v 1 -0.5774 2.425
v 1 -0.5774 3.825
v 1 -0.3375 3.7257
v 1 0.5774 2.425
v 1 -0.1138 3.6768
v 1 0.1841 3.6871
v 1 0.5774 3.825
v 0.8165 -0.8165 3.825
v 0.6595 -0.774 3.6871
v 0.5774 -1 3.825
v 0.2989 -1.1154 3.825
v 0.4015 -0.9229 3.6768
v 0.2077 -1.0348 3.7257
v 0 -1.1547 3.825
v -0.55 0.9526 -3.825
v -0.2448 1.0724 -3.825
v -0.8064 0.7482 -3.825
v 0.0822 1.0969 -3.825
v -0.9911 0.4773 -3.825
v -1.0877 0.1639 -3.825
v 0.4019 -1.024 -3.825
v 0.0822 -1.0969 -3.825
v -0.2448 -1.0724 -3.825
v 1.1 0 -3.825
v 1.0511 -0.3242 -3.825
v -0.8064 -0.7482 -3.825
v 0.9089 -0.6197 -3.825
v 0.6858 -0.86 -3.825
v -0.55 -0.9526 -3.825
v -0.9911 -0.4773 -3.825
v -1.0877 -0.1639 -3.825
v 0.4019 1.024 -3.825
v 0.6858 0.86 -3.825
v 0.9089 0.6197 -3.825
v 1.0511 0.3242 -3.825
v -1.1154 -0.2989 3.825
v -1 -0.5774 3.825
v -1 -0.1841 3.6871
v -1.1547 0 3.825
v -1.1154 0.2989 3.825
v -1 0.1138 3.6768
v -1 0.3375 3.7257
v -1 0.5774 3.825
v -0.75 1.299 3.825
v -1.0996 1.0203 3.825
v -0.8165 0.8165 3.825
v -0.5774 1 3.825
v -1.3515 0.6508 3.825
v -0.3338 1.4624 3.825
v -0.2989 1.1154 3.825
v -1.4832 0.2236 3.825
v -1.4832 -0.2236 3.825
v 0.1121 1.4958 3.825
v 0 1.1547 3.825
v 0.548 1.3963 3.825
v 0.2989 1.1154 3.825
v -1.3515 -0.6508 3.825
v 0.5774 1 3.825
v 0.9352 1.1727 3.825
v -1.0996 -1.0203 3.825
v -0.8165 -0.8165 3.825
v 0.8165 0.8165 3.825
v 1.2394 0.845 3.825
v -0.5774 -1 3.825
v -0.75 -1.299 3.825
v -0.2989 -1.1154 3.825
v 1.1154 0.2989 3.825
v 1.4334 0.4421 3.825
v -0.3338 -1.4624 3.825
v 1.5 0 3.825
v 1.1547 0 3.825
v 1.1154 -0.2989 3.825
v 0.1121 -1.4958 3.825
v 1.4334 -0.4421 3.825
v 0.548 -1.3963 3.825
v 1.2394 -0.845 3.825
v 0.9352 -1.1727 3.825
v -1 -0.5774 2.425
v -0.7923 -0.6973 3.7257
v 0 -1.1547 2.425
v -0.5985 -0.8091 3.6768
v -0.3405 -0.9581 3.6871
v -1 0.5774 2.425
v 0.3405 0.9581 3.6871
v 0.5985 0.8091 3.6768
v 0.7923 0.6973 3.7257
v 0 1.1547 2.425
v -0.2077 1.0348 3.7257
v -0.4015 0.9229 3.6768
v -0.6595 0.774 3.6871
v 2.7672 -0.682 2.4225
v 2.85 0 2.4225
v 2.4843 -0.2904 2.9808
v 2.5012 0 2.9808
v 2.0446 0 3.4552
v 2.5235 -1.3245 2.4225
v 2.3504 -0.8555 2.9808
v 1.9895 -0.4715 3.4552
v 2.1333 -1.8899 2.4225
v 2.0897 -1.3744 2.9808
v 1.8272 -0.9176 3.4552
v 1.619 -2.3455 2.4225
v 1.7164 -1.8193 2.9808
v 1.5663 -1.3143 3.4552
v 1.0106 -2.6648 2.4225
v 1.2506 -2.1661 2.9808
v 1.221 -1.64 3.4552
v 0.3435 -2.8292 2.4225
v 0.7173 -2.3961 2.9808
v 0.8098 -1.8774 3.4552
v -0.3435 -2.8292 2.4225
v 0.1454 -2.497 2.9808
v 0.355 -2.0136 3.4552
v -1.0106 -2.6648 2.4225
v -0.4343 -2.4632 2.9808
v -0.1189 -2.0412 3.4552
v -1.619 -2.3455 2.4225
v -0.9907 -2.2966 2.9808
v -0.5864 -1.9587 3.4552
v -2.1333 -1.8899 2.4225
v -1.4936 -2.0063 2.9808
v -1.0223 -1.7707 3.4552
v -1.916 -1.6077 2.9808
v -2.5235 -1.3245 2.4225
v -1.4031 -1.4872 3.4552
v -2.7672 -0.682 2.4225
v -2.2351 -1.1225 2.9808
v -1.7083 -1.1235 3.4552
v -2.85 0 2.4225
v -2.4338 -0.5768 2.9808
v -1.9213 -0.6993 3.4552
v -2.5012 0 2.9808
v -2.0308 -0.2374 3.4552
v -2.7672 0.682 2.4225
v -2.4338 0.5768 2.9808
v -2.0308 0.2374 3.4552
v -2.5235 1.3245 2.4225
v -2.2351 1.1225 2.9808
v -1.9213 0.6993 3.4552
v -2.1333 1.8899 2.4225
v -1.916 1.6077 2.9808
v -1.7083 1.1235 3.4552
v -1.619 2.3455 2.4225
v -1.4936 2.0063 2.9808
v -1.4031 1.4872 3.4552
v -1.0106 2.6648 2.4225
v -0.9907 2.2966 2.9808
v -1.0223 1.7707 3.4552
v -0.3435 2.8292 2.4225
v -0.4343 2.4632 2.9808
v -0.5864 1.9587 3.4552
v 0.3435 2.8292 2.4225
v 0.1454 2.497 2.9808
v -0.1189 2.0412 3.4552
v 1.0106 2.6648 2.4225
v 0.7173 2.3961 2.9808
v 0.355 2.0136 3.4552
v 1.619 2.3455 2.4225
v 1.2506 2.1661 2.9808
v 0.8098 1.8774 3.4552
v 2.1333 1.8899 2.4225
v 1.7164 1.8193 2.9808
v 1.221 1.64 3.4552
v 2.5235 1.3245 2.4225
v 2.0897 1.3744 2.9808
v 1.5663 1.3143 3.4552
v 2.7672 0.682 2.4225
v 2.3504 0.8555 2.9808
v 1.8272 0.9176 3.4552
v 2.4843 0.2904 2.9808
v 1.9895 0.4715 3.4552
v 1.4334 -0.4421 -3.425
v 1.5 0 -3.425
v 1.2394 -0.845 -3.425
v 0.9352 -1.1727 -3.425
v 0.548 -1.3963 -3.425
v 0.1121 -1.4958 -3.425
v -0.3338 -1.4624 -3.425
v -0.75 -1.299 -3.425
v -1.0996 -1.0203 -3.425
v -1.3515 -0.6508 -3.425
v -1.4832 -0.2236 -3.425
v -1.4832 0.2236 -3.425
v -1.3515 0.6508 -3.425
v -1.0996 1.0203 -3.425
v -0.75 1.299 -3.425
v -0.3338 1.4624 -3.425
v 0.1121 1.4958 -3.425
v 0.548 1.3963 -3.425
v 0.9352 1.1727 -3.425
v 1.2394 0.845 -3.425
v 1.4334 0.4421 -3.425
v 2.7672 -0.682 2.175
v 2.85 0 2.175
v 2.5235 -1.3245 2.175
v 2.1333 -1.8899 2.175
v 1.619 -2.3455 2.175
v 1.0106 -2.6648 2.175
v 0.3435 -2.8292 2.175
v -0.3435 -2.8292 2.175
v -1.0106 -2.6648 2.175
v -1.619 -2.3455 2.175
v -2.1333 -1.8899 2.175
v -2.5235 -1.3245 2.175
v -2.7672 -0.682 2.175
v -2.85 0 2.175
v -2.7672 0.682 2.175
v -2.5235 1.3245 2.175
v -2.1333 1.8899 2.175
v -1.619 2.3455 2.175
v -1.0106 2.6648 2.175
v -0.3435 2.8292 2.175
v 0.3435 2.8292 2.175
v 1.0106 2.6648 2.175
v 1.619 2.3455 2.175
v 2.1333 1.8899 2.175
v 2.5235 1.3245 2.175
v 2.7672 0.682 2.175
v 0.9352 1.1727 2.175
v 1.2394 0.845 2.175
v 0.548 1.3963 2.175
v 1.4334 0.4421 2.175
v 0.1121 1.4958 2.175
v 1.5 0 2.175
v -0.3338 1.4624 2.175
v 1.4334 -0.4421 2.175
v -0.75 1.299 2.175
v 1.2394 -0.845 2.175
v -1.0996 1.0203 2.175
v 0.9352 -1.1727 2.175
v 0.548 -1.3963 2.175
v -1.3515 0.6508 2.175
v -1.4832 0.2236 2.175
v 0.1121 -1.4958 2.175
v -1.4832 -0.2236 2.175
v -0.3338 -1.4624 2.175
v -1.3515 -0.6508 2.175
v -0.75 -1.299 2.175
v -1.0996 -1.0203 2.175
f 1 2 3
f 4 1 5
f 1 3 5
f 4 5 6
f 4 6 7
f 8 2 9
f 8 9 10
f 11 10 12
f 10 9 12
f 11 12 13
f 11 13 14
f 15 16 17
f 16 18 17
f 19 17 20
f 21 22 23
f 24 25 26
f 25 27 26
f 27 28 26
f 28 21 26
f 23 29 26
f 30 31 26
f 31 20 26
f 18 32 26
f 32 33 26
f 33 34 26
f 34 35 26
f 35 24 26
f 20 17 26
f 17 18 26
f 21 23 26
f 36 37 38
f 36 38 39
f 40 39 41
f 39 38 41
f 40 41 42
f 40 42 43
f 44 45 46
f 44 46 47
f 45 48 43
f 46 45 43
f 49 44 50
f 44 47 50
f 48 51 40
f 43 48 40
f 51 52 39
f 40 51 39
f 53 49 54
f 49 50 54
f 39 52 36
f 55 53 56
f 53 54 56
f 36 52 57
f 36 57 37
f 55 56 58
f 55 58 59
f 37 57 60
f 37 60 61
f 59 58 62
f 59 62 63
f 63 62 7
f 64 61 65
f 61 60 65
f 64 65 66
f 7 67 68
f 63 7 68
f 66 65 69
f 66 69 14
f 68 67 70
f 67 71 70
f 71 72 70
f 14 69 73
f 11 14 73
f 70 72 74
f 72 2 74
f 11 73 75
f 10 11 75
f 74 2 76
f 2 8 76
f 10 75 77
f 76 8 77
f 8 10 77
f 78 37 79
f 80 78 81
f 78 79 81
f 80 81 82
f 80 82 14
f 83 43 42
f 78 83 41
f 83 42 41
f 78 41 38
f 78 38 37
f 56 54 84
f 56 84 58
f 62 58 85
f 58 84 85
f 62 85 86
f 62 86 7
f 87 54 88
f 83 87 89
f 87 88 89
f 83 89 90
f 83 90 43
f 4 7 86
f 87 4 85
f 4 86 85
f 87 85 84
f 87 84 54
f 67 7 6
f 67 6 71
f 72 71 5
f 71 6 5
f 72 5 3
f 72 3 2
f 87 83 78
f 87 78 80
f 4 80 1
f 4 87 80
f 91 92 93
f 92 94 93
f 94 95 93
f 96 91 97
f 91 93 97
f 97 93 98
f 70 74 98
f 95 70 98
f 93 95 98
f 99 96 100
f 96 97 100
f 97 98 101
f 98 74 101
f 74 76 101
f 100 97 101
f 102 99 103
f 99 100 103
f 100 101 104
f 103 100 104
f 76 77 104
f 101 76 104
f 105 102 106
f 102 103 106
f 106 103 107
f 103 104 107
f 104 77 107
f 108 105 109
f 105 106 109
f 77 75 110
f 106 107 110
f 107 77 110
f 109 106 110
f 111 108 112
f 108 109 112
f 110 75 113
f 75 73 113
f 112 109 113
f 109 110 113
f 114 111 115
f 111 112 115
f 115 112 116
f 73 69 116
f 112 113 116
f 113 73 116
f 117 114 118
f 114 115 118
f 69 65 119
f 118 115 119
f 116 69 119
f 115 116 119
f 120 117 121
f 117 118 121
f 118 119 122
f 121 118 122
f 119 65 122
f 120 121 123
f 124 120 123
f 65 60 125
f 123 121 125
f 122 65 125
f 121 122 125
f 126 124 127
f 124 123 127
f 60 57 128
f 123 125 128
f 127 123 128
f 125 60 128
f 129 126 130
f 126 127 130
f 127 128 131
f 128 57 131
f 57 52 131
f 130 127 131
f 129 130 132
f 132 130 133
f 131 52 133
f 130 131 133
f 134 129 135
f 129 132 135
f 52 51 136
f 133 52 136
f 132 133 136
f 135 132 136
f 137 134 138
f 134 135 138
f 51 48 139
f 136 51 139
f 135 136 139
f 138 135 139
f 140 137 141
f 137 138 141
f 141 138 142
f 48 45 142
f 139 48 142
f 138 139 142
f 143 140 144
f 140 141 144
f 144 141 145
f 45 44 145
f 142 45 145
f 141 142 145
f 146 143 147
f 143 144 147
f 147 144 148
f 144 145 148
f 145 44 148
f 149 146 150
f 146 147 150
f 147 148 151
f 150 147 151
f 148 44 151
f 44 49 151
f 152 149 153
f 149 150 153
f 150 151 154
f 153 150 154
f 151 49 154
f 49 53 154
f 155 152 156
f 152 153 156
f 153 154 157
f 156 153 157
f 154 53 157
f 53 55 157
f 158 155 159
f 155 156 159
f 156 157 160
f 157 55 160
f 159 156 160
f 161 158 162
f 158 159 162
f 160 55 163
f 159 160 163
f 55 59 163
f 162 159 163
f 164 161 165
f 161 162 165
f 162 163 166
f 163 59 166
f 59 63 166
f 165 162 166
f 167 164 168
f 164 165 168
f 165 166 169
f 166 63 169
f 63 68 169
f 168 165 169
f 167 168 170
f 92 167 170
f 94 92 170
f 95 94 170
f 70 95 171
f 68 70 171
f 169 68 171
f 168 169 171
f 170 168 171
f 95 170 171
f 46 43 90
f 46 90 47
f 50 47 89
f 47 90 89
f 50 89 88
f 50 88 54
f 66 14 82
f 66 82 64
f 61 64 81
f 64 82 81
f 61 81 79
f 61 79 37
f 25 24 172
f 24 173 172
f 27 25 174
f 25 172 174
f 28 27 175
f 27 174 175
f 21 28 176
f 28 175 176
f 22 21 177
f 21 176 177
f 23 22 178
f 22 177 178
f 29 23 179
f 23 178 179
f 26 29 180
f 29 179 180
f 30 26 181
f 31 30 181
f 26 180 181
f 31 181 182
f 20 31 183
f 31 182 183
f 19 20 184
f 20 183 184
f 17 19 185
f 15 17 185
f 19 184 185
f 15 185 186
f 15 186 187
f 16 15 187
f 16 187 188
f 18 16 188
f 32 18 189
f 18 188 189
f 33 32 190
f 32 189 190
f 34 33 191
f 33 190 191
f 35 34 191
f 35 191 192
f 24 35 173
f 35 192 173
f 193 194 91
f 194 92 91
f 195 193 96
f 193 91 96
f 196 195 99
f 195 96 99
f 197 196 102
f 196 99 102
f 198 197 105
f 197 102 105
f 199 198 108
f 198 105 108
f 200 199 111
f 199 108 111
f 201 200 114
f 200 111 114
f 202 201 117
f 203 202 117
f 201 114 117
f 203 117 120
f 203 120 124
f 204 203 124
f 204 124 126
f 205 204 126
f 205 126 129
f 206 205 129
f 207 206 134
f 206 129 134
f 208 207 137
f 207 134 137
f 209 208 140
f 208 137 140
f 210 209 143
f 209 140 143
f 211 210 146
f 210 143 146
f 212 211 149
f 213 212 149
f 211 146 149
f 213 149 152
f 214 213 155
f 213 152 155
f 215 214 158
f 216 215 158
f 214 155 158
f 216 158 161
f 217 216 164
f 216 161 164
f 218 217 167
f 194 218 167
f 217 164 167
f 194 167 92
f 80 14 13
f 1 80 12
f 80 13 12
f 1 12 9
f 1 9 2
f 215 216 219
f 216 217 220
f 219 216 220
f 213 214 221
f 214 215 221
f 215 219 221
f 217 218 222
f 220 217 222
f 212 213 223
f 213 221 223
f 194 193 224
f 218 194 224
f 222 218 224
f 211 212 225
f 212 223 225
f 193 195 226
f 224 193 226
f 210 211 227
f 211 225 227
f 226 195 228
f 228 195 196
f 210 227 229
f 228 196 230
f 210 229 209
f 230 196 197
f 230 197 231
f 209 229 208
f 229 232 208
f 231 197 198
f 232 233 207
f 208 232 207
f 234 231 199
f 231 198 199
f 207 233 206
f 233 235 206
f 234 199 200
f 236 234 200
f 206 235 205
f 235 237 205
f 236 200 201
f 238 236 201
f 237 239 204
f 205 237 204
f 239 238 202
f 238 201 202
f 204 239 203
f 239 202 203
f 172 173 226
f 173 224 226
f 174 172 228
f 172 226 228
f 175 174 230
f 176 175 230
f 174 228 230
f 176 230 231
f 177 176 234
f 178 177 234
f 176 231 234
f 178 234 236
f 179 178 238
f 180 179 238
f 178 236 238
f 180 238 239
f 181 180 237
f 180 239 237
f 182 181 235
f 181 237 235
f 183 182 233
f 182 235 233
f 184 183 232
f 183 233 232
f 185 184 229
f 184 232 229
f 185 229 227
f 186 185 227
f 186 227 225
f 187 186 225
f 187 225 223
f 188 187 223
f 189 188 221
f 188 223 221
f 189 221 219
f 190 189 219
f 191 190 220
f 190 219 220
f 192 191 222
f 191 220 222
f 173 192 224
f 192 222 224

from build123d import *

# Parameters (mm, degrees)
CUT_EXTRUDE1_DEPTH = 1.4


with BuildPart() as part:
    # Sketch2 → Revolve1 (revolve)
    with BuildSketch(Plane(origin=(0, 0, 0), x_dir=(0, 0, -1), z_dir=(1, 0, 0)), mode=Mode.PRIVATE) as revolve1_sk:
        with BuildLine():
            Line((-3.825, 0), (3.825, 0))
            Line((3.825, 0), (3.825, 1.1))
            Line((3.825, 1.1), (3.425, 1.5))
            Line((3.425, 1.5), (-2.175, 1.5))
            Line((-2.175, 1.5), (-2.175, 2.85))
            Line((-2.175, 2.85), (-2.4225, 2.85))
            ThreePointArc((-2.4225, 2.85), (-3.22987489, 2.285251969), (-3.825, 1.5))
            Line((-3.825, 1.5), (-3.825, 0))
        make_face()
    revolve(revolve1_sk.sketch.rotate(Axis((0, 0, 3.825), (0, 0, -1)), 90), axis=Axis((0, 0, 3.825), (0, 0, -1)))

    # Sketch3 → Cut-Extrude1 (cut)
    with BuildSketch(Plane.XY.offset(3.825)):
        Polygon((0, 1.154700538), (-1, 0.577350269), (-1, -0.577350269), (0, -1.154700538), (1, -0.577350269), (1, 0.577350269), align=None)
    extrude(amount=-CUT_EXTRUDE1_DEPTH, mode=Mode.SUBTRACT)

    # Cut-Extrude2 cone 1 section (through the dimple's axis) → Cut-Extrude2 (revolve, cut)
    with BuildSketch(Plane(origin=(0, 0, 3.825), x_dir=(0, -1, 0), z_dir=(1, 0, 0))):
        Polygon((0, 0), (1.154700538, 0), (0, 1.154700538), align=None)
    revolve(axis=Axis((0, 0, 3.825), (0, 0, -1)), mode=Mode.SUBTRACT)


solid = part.part
